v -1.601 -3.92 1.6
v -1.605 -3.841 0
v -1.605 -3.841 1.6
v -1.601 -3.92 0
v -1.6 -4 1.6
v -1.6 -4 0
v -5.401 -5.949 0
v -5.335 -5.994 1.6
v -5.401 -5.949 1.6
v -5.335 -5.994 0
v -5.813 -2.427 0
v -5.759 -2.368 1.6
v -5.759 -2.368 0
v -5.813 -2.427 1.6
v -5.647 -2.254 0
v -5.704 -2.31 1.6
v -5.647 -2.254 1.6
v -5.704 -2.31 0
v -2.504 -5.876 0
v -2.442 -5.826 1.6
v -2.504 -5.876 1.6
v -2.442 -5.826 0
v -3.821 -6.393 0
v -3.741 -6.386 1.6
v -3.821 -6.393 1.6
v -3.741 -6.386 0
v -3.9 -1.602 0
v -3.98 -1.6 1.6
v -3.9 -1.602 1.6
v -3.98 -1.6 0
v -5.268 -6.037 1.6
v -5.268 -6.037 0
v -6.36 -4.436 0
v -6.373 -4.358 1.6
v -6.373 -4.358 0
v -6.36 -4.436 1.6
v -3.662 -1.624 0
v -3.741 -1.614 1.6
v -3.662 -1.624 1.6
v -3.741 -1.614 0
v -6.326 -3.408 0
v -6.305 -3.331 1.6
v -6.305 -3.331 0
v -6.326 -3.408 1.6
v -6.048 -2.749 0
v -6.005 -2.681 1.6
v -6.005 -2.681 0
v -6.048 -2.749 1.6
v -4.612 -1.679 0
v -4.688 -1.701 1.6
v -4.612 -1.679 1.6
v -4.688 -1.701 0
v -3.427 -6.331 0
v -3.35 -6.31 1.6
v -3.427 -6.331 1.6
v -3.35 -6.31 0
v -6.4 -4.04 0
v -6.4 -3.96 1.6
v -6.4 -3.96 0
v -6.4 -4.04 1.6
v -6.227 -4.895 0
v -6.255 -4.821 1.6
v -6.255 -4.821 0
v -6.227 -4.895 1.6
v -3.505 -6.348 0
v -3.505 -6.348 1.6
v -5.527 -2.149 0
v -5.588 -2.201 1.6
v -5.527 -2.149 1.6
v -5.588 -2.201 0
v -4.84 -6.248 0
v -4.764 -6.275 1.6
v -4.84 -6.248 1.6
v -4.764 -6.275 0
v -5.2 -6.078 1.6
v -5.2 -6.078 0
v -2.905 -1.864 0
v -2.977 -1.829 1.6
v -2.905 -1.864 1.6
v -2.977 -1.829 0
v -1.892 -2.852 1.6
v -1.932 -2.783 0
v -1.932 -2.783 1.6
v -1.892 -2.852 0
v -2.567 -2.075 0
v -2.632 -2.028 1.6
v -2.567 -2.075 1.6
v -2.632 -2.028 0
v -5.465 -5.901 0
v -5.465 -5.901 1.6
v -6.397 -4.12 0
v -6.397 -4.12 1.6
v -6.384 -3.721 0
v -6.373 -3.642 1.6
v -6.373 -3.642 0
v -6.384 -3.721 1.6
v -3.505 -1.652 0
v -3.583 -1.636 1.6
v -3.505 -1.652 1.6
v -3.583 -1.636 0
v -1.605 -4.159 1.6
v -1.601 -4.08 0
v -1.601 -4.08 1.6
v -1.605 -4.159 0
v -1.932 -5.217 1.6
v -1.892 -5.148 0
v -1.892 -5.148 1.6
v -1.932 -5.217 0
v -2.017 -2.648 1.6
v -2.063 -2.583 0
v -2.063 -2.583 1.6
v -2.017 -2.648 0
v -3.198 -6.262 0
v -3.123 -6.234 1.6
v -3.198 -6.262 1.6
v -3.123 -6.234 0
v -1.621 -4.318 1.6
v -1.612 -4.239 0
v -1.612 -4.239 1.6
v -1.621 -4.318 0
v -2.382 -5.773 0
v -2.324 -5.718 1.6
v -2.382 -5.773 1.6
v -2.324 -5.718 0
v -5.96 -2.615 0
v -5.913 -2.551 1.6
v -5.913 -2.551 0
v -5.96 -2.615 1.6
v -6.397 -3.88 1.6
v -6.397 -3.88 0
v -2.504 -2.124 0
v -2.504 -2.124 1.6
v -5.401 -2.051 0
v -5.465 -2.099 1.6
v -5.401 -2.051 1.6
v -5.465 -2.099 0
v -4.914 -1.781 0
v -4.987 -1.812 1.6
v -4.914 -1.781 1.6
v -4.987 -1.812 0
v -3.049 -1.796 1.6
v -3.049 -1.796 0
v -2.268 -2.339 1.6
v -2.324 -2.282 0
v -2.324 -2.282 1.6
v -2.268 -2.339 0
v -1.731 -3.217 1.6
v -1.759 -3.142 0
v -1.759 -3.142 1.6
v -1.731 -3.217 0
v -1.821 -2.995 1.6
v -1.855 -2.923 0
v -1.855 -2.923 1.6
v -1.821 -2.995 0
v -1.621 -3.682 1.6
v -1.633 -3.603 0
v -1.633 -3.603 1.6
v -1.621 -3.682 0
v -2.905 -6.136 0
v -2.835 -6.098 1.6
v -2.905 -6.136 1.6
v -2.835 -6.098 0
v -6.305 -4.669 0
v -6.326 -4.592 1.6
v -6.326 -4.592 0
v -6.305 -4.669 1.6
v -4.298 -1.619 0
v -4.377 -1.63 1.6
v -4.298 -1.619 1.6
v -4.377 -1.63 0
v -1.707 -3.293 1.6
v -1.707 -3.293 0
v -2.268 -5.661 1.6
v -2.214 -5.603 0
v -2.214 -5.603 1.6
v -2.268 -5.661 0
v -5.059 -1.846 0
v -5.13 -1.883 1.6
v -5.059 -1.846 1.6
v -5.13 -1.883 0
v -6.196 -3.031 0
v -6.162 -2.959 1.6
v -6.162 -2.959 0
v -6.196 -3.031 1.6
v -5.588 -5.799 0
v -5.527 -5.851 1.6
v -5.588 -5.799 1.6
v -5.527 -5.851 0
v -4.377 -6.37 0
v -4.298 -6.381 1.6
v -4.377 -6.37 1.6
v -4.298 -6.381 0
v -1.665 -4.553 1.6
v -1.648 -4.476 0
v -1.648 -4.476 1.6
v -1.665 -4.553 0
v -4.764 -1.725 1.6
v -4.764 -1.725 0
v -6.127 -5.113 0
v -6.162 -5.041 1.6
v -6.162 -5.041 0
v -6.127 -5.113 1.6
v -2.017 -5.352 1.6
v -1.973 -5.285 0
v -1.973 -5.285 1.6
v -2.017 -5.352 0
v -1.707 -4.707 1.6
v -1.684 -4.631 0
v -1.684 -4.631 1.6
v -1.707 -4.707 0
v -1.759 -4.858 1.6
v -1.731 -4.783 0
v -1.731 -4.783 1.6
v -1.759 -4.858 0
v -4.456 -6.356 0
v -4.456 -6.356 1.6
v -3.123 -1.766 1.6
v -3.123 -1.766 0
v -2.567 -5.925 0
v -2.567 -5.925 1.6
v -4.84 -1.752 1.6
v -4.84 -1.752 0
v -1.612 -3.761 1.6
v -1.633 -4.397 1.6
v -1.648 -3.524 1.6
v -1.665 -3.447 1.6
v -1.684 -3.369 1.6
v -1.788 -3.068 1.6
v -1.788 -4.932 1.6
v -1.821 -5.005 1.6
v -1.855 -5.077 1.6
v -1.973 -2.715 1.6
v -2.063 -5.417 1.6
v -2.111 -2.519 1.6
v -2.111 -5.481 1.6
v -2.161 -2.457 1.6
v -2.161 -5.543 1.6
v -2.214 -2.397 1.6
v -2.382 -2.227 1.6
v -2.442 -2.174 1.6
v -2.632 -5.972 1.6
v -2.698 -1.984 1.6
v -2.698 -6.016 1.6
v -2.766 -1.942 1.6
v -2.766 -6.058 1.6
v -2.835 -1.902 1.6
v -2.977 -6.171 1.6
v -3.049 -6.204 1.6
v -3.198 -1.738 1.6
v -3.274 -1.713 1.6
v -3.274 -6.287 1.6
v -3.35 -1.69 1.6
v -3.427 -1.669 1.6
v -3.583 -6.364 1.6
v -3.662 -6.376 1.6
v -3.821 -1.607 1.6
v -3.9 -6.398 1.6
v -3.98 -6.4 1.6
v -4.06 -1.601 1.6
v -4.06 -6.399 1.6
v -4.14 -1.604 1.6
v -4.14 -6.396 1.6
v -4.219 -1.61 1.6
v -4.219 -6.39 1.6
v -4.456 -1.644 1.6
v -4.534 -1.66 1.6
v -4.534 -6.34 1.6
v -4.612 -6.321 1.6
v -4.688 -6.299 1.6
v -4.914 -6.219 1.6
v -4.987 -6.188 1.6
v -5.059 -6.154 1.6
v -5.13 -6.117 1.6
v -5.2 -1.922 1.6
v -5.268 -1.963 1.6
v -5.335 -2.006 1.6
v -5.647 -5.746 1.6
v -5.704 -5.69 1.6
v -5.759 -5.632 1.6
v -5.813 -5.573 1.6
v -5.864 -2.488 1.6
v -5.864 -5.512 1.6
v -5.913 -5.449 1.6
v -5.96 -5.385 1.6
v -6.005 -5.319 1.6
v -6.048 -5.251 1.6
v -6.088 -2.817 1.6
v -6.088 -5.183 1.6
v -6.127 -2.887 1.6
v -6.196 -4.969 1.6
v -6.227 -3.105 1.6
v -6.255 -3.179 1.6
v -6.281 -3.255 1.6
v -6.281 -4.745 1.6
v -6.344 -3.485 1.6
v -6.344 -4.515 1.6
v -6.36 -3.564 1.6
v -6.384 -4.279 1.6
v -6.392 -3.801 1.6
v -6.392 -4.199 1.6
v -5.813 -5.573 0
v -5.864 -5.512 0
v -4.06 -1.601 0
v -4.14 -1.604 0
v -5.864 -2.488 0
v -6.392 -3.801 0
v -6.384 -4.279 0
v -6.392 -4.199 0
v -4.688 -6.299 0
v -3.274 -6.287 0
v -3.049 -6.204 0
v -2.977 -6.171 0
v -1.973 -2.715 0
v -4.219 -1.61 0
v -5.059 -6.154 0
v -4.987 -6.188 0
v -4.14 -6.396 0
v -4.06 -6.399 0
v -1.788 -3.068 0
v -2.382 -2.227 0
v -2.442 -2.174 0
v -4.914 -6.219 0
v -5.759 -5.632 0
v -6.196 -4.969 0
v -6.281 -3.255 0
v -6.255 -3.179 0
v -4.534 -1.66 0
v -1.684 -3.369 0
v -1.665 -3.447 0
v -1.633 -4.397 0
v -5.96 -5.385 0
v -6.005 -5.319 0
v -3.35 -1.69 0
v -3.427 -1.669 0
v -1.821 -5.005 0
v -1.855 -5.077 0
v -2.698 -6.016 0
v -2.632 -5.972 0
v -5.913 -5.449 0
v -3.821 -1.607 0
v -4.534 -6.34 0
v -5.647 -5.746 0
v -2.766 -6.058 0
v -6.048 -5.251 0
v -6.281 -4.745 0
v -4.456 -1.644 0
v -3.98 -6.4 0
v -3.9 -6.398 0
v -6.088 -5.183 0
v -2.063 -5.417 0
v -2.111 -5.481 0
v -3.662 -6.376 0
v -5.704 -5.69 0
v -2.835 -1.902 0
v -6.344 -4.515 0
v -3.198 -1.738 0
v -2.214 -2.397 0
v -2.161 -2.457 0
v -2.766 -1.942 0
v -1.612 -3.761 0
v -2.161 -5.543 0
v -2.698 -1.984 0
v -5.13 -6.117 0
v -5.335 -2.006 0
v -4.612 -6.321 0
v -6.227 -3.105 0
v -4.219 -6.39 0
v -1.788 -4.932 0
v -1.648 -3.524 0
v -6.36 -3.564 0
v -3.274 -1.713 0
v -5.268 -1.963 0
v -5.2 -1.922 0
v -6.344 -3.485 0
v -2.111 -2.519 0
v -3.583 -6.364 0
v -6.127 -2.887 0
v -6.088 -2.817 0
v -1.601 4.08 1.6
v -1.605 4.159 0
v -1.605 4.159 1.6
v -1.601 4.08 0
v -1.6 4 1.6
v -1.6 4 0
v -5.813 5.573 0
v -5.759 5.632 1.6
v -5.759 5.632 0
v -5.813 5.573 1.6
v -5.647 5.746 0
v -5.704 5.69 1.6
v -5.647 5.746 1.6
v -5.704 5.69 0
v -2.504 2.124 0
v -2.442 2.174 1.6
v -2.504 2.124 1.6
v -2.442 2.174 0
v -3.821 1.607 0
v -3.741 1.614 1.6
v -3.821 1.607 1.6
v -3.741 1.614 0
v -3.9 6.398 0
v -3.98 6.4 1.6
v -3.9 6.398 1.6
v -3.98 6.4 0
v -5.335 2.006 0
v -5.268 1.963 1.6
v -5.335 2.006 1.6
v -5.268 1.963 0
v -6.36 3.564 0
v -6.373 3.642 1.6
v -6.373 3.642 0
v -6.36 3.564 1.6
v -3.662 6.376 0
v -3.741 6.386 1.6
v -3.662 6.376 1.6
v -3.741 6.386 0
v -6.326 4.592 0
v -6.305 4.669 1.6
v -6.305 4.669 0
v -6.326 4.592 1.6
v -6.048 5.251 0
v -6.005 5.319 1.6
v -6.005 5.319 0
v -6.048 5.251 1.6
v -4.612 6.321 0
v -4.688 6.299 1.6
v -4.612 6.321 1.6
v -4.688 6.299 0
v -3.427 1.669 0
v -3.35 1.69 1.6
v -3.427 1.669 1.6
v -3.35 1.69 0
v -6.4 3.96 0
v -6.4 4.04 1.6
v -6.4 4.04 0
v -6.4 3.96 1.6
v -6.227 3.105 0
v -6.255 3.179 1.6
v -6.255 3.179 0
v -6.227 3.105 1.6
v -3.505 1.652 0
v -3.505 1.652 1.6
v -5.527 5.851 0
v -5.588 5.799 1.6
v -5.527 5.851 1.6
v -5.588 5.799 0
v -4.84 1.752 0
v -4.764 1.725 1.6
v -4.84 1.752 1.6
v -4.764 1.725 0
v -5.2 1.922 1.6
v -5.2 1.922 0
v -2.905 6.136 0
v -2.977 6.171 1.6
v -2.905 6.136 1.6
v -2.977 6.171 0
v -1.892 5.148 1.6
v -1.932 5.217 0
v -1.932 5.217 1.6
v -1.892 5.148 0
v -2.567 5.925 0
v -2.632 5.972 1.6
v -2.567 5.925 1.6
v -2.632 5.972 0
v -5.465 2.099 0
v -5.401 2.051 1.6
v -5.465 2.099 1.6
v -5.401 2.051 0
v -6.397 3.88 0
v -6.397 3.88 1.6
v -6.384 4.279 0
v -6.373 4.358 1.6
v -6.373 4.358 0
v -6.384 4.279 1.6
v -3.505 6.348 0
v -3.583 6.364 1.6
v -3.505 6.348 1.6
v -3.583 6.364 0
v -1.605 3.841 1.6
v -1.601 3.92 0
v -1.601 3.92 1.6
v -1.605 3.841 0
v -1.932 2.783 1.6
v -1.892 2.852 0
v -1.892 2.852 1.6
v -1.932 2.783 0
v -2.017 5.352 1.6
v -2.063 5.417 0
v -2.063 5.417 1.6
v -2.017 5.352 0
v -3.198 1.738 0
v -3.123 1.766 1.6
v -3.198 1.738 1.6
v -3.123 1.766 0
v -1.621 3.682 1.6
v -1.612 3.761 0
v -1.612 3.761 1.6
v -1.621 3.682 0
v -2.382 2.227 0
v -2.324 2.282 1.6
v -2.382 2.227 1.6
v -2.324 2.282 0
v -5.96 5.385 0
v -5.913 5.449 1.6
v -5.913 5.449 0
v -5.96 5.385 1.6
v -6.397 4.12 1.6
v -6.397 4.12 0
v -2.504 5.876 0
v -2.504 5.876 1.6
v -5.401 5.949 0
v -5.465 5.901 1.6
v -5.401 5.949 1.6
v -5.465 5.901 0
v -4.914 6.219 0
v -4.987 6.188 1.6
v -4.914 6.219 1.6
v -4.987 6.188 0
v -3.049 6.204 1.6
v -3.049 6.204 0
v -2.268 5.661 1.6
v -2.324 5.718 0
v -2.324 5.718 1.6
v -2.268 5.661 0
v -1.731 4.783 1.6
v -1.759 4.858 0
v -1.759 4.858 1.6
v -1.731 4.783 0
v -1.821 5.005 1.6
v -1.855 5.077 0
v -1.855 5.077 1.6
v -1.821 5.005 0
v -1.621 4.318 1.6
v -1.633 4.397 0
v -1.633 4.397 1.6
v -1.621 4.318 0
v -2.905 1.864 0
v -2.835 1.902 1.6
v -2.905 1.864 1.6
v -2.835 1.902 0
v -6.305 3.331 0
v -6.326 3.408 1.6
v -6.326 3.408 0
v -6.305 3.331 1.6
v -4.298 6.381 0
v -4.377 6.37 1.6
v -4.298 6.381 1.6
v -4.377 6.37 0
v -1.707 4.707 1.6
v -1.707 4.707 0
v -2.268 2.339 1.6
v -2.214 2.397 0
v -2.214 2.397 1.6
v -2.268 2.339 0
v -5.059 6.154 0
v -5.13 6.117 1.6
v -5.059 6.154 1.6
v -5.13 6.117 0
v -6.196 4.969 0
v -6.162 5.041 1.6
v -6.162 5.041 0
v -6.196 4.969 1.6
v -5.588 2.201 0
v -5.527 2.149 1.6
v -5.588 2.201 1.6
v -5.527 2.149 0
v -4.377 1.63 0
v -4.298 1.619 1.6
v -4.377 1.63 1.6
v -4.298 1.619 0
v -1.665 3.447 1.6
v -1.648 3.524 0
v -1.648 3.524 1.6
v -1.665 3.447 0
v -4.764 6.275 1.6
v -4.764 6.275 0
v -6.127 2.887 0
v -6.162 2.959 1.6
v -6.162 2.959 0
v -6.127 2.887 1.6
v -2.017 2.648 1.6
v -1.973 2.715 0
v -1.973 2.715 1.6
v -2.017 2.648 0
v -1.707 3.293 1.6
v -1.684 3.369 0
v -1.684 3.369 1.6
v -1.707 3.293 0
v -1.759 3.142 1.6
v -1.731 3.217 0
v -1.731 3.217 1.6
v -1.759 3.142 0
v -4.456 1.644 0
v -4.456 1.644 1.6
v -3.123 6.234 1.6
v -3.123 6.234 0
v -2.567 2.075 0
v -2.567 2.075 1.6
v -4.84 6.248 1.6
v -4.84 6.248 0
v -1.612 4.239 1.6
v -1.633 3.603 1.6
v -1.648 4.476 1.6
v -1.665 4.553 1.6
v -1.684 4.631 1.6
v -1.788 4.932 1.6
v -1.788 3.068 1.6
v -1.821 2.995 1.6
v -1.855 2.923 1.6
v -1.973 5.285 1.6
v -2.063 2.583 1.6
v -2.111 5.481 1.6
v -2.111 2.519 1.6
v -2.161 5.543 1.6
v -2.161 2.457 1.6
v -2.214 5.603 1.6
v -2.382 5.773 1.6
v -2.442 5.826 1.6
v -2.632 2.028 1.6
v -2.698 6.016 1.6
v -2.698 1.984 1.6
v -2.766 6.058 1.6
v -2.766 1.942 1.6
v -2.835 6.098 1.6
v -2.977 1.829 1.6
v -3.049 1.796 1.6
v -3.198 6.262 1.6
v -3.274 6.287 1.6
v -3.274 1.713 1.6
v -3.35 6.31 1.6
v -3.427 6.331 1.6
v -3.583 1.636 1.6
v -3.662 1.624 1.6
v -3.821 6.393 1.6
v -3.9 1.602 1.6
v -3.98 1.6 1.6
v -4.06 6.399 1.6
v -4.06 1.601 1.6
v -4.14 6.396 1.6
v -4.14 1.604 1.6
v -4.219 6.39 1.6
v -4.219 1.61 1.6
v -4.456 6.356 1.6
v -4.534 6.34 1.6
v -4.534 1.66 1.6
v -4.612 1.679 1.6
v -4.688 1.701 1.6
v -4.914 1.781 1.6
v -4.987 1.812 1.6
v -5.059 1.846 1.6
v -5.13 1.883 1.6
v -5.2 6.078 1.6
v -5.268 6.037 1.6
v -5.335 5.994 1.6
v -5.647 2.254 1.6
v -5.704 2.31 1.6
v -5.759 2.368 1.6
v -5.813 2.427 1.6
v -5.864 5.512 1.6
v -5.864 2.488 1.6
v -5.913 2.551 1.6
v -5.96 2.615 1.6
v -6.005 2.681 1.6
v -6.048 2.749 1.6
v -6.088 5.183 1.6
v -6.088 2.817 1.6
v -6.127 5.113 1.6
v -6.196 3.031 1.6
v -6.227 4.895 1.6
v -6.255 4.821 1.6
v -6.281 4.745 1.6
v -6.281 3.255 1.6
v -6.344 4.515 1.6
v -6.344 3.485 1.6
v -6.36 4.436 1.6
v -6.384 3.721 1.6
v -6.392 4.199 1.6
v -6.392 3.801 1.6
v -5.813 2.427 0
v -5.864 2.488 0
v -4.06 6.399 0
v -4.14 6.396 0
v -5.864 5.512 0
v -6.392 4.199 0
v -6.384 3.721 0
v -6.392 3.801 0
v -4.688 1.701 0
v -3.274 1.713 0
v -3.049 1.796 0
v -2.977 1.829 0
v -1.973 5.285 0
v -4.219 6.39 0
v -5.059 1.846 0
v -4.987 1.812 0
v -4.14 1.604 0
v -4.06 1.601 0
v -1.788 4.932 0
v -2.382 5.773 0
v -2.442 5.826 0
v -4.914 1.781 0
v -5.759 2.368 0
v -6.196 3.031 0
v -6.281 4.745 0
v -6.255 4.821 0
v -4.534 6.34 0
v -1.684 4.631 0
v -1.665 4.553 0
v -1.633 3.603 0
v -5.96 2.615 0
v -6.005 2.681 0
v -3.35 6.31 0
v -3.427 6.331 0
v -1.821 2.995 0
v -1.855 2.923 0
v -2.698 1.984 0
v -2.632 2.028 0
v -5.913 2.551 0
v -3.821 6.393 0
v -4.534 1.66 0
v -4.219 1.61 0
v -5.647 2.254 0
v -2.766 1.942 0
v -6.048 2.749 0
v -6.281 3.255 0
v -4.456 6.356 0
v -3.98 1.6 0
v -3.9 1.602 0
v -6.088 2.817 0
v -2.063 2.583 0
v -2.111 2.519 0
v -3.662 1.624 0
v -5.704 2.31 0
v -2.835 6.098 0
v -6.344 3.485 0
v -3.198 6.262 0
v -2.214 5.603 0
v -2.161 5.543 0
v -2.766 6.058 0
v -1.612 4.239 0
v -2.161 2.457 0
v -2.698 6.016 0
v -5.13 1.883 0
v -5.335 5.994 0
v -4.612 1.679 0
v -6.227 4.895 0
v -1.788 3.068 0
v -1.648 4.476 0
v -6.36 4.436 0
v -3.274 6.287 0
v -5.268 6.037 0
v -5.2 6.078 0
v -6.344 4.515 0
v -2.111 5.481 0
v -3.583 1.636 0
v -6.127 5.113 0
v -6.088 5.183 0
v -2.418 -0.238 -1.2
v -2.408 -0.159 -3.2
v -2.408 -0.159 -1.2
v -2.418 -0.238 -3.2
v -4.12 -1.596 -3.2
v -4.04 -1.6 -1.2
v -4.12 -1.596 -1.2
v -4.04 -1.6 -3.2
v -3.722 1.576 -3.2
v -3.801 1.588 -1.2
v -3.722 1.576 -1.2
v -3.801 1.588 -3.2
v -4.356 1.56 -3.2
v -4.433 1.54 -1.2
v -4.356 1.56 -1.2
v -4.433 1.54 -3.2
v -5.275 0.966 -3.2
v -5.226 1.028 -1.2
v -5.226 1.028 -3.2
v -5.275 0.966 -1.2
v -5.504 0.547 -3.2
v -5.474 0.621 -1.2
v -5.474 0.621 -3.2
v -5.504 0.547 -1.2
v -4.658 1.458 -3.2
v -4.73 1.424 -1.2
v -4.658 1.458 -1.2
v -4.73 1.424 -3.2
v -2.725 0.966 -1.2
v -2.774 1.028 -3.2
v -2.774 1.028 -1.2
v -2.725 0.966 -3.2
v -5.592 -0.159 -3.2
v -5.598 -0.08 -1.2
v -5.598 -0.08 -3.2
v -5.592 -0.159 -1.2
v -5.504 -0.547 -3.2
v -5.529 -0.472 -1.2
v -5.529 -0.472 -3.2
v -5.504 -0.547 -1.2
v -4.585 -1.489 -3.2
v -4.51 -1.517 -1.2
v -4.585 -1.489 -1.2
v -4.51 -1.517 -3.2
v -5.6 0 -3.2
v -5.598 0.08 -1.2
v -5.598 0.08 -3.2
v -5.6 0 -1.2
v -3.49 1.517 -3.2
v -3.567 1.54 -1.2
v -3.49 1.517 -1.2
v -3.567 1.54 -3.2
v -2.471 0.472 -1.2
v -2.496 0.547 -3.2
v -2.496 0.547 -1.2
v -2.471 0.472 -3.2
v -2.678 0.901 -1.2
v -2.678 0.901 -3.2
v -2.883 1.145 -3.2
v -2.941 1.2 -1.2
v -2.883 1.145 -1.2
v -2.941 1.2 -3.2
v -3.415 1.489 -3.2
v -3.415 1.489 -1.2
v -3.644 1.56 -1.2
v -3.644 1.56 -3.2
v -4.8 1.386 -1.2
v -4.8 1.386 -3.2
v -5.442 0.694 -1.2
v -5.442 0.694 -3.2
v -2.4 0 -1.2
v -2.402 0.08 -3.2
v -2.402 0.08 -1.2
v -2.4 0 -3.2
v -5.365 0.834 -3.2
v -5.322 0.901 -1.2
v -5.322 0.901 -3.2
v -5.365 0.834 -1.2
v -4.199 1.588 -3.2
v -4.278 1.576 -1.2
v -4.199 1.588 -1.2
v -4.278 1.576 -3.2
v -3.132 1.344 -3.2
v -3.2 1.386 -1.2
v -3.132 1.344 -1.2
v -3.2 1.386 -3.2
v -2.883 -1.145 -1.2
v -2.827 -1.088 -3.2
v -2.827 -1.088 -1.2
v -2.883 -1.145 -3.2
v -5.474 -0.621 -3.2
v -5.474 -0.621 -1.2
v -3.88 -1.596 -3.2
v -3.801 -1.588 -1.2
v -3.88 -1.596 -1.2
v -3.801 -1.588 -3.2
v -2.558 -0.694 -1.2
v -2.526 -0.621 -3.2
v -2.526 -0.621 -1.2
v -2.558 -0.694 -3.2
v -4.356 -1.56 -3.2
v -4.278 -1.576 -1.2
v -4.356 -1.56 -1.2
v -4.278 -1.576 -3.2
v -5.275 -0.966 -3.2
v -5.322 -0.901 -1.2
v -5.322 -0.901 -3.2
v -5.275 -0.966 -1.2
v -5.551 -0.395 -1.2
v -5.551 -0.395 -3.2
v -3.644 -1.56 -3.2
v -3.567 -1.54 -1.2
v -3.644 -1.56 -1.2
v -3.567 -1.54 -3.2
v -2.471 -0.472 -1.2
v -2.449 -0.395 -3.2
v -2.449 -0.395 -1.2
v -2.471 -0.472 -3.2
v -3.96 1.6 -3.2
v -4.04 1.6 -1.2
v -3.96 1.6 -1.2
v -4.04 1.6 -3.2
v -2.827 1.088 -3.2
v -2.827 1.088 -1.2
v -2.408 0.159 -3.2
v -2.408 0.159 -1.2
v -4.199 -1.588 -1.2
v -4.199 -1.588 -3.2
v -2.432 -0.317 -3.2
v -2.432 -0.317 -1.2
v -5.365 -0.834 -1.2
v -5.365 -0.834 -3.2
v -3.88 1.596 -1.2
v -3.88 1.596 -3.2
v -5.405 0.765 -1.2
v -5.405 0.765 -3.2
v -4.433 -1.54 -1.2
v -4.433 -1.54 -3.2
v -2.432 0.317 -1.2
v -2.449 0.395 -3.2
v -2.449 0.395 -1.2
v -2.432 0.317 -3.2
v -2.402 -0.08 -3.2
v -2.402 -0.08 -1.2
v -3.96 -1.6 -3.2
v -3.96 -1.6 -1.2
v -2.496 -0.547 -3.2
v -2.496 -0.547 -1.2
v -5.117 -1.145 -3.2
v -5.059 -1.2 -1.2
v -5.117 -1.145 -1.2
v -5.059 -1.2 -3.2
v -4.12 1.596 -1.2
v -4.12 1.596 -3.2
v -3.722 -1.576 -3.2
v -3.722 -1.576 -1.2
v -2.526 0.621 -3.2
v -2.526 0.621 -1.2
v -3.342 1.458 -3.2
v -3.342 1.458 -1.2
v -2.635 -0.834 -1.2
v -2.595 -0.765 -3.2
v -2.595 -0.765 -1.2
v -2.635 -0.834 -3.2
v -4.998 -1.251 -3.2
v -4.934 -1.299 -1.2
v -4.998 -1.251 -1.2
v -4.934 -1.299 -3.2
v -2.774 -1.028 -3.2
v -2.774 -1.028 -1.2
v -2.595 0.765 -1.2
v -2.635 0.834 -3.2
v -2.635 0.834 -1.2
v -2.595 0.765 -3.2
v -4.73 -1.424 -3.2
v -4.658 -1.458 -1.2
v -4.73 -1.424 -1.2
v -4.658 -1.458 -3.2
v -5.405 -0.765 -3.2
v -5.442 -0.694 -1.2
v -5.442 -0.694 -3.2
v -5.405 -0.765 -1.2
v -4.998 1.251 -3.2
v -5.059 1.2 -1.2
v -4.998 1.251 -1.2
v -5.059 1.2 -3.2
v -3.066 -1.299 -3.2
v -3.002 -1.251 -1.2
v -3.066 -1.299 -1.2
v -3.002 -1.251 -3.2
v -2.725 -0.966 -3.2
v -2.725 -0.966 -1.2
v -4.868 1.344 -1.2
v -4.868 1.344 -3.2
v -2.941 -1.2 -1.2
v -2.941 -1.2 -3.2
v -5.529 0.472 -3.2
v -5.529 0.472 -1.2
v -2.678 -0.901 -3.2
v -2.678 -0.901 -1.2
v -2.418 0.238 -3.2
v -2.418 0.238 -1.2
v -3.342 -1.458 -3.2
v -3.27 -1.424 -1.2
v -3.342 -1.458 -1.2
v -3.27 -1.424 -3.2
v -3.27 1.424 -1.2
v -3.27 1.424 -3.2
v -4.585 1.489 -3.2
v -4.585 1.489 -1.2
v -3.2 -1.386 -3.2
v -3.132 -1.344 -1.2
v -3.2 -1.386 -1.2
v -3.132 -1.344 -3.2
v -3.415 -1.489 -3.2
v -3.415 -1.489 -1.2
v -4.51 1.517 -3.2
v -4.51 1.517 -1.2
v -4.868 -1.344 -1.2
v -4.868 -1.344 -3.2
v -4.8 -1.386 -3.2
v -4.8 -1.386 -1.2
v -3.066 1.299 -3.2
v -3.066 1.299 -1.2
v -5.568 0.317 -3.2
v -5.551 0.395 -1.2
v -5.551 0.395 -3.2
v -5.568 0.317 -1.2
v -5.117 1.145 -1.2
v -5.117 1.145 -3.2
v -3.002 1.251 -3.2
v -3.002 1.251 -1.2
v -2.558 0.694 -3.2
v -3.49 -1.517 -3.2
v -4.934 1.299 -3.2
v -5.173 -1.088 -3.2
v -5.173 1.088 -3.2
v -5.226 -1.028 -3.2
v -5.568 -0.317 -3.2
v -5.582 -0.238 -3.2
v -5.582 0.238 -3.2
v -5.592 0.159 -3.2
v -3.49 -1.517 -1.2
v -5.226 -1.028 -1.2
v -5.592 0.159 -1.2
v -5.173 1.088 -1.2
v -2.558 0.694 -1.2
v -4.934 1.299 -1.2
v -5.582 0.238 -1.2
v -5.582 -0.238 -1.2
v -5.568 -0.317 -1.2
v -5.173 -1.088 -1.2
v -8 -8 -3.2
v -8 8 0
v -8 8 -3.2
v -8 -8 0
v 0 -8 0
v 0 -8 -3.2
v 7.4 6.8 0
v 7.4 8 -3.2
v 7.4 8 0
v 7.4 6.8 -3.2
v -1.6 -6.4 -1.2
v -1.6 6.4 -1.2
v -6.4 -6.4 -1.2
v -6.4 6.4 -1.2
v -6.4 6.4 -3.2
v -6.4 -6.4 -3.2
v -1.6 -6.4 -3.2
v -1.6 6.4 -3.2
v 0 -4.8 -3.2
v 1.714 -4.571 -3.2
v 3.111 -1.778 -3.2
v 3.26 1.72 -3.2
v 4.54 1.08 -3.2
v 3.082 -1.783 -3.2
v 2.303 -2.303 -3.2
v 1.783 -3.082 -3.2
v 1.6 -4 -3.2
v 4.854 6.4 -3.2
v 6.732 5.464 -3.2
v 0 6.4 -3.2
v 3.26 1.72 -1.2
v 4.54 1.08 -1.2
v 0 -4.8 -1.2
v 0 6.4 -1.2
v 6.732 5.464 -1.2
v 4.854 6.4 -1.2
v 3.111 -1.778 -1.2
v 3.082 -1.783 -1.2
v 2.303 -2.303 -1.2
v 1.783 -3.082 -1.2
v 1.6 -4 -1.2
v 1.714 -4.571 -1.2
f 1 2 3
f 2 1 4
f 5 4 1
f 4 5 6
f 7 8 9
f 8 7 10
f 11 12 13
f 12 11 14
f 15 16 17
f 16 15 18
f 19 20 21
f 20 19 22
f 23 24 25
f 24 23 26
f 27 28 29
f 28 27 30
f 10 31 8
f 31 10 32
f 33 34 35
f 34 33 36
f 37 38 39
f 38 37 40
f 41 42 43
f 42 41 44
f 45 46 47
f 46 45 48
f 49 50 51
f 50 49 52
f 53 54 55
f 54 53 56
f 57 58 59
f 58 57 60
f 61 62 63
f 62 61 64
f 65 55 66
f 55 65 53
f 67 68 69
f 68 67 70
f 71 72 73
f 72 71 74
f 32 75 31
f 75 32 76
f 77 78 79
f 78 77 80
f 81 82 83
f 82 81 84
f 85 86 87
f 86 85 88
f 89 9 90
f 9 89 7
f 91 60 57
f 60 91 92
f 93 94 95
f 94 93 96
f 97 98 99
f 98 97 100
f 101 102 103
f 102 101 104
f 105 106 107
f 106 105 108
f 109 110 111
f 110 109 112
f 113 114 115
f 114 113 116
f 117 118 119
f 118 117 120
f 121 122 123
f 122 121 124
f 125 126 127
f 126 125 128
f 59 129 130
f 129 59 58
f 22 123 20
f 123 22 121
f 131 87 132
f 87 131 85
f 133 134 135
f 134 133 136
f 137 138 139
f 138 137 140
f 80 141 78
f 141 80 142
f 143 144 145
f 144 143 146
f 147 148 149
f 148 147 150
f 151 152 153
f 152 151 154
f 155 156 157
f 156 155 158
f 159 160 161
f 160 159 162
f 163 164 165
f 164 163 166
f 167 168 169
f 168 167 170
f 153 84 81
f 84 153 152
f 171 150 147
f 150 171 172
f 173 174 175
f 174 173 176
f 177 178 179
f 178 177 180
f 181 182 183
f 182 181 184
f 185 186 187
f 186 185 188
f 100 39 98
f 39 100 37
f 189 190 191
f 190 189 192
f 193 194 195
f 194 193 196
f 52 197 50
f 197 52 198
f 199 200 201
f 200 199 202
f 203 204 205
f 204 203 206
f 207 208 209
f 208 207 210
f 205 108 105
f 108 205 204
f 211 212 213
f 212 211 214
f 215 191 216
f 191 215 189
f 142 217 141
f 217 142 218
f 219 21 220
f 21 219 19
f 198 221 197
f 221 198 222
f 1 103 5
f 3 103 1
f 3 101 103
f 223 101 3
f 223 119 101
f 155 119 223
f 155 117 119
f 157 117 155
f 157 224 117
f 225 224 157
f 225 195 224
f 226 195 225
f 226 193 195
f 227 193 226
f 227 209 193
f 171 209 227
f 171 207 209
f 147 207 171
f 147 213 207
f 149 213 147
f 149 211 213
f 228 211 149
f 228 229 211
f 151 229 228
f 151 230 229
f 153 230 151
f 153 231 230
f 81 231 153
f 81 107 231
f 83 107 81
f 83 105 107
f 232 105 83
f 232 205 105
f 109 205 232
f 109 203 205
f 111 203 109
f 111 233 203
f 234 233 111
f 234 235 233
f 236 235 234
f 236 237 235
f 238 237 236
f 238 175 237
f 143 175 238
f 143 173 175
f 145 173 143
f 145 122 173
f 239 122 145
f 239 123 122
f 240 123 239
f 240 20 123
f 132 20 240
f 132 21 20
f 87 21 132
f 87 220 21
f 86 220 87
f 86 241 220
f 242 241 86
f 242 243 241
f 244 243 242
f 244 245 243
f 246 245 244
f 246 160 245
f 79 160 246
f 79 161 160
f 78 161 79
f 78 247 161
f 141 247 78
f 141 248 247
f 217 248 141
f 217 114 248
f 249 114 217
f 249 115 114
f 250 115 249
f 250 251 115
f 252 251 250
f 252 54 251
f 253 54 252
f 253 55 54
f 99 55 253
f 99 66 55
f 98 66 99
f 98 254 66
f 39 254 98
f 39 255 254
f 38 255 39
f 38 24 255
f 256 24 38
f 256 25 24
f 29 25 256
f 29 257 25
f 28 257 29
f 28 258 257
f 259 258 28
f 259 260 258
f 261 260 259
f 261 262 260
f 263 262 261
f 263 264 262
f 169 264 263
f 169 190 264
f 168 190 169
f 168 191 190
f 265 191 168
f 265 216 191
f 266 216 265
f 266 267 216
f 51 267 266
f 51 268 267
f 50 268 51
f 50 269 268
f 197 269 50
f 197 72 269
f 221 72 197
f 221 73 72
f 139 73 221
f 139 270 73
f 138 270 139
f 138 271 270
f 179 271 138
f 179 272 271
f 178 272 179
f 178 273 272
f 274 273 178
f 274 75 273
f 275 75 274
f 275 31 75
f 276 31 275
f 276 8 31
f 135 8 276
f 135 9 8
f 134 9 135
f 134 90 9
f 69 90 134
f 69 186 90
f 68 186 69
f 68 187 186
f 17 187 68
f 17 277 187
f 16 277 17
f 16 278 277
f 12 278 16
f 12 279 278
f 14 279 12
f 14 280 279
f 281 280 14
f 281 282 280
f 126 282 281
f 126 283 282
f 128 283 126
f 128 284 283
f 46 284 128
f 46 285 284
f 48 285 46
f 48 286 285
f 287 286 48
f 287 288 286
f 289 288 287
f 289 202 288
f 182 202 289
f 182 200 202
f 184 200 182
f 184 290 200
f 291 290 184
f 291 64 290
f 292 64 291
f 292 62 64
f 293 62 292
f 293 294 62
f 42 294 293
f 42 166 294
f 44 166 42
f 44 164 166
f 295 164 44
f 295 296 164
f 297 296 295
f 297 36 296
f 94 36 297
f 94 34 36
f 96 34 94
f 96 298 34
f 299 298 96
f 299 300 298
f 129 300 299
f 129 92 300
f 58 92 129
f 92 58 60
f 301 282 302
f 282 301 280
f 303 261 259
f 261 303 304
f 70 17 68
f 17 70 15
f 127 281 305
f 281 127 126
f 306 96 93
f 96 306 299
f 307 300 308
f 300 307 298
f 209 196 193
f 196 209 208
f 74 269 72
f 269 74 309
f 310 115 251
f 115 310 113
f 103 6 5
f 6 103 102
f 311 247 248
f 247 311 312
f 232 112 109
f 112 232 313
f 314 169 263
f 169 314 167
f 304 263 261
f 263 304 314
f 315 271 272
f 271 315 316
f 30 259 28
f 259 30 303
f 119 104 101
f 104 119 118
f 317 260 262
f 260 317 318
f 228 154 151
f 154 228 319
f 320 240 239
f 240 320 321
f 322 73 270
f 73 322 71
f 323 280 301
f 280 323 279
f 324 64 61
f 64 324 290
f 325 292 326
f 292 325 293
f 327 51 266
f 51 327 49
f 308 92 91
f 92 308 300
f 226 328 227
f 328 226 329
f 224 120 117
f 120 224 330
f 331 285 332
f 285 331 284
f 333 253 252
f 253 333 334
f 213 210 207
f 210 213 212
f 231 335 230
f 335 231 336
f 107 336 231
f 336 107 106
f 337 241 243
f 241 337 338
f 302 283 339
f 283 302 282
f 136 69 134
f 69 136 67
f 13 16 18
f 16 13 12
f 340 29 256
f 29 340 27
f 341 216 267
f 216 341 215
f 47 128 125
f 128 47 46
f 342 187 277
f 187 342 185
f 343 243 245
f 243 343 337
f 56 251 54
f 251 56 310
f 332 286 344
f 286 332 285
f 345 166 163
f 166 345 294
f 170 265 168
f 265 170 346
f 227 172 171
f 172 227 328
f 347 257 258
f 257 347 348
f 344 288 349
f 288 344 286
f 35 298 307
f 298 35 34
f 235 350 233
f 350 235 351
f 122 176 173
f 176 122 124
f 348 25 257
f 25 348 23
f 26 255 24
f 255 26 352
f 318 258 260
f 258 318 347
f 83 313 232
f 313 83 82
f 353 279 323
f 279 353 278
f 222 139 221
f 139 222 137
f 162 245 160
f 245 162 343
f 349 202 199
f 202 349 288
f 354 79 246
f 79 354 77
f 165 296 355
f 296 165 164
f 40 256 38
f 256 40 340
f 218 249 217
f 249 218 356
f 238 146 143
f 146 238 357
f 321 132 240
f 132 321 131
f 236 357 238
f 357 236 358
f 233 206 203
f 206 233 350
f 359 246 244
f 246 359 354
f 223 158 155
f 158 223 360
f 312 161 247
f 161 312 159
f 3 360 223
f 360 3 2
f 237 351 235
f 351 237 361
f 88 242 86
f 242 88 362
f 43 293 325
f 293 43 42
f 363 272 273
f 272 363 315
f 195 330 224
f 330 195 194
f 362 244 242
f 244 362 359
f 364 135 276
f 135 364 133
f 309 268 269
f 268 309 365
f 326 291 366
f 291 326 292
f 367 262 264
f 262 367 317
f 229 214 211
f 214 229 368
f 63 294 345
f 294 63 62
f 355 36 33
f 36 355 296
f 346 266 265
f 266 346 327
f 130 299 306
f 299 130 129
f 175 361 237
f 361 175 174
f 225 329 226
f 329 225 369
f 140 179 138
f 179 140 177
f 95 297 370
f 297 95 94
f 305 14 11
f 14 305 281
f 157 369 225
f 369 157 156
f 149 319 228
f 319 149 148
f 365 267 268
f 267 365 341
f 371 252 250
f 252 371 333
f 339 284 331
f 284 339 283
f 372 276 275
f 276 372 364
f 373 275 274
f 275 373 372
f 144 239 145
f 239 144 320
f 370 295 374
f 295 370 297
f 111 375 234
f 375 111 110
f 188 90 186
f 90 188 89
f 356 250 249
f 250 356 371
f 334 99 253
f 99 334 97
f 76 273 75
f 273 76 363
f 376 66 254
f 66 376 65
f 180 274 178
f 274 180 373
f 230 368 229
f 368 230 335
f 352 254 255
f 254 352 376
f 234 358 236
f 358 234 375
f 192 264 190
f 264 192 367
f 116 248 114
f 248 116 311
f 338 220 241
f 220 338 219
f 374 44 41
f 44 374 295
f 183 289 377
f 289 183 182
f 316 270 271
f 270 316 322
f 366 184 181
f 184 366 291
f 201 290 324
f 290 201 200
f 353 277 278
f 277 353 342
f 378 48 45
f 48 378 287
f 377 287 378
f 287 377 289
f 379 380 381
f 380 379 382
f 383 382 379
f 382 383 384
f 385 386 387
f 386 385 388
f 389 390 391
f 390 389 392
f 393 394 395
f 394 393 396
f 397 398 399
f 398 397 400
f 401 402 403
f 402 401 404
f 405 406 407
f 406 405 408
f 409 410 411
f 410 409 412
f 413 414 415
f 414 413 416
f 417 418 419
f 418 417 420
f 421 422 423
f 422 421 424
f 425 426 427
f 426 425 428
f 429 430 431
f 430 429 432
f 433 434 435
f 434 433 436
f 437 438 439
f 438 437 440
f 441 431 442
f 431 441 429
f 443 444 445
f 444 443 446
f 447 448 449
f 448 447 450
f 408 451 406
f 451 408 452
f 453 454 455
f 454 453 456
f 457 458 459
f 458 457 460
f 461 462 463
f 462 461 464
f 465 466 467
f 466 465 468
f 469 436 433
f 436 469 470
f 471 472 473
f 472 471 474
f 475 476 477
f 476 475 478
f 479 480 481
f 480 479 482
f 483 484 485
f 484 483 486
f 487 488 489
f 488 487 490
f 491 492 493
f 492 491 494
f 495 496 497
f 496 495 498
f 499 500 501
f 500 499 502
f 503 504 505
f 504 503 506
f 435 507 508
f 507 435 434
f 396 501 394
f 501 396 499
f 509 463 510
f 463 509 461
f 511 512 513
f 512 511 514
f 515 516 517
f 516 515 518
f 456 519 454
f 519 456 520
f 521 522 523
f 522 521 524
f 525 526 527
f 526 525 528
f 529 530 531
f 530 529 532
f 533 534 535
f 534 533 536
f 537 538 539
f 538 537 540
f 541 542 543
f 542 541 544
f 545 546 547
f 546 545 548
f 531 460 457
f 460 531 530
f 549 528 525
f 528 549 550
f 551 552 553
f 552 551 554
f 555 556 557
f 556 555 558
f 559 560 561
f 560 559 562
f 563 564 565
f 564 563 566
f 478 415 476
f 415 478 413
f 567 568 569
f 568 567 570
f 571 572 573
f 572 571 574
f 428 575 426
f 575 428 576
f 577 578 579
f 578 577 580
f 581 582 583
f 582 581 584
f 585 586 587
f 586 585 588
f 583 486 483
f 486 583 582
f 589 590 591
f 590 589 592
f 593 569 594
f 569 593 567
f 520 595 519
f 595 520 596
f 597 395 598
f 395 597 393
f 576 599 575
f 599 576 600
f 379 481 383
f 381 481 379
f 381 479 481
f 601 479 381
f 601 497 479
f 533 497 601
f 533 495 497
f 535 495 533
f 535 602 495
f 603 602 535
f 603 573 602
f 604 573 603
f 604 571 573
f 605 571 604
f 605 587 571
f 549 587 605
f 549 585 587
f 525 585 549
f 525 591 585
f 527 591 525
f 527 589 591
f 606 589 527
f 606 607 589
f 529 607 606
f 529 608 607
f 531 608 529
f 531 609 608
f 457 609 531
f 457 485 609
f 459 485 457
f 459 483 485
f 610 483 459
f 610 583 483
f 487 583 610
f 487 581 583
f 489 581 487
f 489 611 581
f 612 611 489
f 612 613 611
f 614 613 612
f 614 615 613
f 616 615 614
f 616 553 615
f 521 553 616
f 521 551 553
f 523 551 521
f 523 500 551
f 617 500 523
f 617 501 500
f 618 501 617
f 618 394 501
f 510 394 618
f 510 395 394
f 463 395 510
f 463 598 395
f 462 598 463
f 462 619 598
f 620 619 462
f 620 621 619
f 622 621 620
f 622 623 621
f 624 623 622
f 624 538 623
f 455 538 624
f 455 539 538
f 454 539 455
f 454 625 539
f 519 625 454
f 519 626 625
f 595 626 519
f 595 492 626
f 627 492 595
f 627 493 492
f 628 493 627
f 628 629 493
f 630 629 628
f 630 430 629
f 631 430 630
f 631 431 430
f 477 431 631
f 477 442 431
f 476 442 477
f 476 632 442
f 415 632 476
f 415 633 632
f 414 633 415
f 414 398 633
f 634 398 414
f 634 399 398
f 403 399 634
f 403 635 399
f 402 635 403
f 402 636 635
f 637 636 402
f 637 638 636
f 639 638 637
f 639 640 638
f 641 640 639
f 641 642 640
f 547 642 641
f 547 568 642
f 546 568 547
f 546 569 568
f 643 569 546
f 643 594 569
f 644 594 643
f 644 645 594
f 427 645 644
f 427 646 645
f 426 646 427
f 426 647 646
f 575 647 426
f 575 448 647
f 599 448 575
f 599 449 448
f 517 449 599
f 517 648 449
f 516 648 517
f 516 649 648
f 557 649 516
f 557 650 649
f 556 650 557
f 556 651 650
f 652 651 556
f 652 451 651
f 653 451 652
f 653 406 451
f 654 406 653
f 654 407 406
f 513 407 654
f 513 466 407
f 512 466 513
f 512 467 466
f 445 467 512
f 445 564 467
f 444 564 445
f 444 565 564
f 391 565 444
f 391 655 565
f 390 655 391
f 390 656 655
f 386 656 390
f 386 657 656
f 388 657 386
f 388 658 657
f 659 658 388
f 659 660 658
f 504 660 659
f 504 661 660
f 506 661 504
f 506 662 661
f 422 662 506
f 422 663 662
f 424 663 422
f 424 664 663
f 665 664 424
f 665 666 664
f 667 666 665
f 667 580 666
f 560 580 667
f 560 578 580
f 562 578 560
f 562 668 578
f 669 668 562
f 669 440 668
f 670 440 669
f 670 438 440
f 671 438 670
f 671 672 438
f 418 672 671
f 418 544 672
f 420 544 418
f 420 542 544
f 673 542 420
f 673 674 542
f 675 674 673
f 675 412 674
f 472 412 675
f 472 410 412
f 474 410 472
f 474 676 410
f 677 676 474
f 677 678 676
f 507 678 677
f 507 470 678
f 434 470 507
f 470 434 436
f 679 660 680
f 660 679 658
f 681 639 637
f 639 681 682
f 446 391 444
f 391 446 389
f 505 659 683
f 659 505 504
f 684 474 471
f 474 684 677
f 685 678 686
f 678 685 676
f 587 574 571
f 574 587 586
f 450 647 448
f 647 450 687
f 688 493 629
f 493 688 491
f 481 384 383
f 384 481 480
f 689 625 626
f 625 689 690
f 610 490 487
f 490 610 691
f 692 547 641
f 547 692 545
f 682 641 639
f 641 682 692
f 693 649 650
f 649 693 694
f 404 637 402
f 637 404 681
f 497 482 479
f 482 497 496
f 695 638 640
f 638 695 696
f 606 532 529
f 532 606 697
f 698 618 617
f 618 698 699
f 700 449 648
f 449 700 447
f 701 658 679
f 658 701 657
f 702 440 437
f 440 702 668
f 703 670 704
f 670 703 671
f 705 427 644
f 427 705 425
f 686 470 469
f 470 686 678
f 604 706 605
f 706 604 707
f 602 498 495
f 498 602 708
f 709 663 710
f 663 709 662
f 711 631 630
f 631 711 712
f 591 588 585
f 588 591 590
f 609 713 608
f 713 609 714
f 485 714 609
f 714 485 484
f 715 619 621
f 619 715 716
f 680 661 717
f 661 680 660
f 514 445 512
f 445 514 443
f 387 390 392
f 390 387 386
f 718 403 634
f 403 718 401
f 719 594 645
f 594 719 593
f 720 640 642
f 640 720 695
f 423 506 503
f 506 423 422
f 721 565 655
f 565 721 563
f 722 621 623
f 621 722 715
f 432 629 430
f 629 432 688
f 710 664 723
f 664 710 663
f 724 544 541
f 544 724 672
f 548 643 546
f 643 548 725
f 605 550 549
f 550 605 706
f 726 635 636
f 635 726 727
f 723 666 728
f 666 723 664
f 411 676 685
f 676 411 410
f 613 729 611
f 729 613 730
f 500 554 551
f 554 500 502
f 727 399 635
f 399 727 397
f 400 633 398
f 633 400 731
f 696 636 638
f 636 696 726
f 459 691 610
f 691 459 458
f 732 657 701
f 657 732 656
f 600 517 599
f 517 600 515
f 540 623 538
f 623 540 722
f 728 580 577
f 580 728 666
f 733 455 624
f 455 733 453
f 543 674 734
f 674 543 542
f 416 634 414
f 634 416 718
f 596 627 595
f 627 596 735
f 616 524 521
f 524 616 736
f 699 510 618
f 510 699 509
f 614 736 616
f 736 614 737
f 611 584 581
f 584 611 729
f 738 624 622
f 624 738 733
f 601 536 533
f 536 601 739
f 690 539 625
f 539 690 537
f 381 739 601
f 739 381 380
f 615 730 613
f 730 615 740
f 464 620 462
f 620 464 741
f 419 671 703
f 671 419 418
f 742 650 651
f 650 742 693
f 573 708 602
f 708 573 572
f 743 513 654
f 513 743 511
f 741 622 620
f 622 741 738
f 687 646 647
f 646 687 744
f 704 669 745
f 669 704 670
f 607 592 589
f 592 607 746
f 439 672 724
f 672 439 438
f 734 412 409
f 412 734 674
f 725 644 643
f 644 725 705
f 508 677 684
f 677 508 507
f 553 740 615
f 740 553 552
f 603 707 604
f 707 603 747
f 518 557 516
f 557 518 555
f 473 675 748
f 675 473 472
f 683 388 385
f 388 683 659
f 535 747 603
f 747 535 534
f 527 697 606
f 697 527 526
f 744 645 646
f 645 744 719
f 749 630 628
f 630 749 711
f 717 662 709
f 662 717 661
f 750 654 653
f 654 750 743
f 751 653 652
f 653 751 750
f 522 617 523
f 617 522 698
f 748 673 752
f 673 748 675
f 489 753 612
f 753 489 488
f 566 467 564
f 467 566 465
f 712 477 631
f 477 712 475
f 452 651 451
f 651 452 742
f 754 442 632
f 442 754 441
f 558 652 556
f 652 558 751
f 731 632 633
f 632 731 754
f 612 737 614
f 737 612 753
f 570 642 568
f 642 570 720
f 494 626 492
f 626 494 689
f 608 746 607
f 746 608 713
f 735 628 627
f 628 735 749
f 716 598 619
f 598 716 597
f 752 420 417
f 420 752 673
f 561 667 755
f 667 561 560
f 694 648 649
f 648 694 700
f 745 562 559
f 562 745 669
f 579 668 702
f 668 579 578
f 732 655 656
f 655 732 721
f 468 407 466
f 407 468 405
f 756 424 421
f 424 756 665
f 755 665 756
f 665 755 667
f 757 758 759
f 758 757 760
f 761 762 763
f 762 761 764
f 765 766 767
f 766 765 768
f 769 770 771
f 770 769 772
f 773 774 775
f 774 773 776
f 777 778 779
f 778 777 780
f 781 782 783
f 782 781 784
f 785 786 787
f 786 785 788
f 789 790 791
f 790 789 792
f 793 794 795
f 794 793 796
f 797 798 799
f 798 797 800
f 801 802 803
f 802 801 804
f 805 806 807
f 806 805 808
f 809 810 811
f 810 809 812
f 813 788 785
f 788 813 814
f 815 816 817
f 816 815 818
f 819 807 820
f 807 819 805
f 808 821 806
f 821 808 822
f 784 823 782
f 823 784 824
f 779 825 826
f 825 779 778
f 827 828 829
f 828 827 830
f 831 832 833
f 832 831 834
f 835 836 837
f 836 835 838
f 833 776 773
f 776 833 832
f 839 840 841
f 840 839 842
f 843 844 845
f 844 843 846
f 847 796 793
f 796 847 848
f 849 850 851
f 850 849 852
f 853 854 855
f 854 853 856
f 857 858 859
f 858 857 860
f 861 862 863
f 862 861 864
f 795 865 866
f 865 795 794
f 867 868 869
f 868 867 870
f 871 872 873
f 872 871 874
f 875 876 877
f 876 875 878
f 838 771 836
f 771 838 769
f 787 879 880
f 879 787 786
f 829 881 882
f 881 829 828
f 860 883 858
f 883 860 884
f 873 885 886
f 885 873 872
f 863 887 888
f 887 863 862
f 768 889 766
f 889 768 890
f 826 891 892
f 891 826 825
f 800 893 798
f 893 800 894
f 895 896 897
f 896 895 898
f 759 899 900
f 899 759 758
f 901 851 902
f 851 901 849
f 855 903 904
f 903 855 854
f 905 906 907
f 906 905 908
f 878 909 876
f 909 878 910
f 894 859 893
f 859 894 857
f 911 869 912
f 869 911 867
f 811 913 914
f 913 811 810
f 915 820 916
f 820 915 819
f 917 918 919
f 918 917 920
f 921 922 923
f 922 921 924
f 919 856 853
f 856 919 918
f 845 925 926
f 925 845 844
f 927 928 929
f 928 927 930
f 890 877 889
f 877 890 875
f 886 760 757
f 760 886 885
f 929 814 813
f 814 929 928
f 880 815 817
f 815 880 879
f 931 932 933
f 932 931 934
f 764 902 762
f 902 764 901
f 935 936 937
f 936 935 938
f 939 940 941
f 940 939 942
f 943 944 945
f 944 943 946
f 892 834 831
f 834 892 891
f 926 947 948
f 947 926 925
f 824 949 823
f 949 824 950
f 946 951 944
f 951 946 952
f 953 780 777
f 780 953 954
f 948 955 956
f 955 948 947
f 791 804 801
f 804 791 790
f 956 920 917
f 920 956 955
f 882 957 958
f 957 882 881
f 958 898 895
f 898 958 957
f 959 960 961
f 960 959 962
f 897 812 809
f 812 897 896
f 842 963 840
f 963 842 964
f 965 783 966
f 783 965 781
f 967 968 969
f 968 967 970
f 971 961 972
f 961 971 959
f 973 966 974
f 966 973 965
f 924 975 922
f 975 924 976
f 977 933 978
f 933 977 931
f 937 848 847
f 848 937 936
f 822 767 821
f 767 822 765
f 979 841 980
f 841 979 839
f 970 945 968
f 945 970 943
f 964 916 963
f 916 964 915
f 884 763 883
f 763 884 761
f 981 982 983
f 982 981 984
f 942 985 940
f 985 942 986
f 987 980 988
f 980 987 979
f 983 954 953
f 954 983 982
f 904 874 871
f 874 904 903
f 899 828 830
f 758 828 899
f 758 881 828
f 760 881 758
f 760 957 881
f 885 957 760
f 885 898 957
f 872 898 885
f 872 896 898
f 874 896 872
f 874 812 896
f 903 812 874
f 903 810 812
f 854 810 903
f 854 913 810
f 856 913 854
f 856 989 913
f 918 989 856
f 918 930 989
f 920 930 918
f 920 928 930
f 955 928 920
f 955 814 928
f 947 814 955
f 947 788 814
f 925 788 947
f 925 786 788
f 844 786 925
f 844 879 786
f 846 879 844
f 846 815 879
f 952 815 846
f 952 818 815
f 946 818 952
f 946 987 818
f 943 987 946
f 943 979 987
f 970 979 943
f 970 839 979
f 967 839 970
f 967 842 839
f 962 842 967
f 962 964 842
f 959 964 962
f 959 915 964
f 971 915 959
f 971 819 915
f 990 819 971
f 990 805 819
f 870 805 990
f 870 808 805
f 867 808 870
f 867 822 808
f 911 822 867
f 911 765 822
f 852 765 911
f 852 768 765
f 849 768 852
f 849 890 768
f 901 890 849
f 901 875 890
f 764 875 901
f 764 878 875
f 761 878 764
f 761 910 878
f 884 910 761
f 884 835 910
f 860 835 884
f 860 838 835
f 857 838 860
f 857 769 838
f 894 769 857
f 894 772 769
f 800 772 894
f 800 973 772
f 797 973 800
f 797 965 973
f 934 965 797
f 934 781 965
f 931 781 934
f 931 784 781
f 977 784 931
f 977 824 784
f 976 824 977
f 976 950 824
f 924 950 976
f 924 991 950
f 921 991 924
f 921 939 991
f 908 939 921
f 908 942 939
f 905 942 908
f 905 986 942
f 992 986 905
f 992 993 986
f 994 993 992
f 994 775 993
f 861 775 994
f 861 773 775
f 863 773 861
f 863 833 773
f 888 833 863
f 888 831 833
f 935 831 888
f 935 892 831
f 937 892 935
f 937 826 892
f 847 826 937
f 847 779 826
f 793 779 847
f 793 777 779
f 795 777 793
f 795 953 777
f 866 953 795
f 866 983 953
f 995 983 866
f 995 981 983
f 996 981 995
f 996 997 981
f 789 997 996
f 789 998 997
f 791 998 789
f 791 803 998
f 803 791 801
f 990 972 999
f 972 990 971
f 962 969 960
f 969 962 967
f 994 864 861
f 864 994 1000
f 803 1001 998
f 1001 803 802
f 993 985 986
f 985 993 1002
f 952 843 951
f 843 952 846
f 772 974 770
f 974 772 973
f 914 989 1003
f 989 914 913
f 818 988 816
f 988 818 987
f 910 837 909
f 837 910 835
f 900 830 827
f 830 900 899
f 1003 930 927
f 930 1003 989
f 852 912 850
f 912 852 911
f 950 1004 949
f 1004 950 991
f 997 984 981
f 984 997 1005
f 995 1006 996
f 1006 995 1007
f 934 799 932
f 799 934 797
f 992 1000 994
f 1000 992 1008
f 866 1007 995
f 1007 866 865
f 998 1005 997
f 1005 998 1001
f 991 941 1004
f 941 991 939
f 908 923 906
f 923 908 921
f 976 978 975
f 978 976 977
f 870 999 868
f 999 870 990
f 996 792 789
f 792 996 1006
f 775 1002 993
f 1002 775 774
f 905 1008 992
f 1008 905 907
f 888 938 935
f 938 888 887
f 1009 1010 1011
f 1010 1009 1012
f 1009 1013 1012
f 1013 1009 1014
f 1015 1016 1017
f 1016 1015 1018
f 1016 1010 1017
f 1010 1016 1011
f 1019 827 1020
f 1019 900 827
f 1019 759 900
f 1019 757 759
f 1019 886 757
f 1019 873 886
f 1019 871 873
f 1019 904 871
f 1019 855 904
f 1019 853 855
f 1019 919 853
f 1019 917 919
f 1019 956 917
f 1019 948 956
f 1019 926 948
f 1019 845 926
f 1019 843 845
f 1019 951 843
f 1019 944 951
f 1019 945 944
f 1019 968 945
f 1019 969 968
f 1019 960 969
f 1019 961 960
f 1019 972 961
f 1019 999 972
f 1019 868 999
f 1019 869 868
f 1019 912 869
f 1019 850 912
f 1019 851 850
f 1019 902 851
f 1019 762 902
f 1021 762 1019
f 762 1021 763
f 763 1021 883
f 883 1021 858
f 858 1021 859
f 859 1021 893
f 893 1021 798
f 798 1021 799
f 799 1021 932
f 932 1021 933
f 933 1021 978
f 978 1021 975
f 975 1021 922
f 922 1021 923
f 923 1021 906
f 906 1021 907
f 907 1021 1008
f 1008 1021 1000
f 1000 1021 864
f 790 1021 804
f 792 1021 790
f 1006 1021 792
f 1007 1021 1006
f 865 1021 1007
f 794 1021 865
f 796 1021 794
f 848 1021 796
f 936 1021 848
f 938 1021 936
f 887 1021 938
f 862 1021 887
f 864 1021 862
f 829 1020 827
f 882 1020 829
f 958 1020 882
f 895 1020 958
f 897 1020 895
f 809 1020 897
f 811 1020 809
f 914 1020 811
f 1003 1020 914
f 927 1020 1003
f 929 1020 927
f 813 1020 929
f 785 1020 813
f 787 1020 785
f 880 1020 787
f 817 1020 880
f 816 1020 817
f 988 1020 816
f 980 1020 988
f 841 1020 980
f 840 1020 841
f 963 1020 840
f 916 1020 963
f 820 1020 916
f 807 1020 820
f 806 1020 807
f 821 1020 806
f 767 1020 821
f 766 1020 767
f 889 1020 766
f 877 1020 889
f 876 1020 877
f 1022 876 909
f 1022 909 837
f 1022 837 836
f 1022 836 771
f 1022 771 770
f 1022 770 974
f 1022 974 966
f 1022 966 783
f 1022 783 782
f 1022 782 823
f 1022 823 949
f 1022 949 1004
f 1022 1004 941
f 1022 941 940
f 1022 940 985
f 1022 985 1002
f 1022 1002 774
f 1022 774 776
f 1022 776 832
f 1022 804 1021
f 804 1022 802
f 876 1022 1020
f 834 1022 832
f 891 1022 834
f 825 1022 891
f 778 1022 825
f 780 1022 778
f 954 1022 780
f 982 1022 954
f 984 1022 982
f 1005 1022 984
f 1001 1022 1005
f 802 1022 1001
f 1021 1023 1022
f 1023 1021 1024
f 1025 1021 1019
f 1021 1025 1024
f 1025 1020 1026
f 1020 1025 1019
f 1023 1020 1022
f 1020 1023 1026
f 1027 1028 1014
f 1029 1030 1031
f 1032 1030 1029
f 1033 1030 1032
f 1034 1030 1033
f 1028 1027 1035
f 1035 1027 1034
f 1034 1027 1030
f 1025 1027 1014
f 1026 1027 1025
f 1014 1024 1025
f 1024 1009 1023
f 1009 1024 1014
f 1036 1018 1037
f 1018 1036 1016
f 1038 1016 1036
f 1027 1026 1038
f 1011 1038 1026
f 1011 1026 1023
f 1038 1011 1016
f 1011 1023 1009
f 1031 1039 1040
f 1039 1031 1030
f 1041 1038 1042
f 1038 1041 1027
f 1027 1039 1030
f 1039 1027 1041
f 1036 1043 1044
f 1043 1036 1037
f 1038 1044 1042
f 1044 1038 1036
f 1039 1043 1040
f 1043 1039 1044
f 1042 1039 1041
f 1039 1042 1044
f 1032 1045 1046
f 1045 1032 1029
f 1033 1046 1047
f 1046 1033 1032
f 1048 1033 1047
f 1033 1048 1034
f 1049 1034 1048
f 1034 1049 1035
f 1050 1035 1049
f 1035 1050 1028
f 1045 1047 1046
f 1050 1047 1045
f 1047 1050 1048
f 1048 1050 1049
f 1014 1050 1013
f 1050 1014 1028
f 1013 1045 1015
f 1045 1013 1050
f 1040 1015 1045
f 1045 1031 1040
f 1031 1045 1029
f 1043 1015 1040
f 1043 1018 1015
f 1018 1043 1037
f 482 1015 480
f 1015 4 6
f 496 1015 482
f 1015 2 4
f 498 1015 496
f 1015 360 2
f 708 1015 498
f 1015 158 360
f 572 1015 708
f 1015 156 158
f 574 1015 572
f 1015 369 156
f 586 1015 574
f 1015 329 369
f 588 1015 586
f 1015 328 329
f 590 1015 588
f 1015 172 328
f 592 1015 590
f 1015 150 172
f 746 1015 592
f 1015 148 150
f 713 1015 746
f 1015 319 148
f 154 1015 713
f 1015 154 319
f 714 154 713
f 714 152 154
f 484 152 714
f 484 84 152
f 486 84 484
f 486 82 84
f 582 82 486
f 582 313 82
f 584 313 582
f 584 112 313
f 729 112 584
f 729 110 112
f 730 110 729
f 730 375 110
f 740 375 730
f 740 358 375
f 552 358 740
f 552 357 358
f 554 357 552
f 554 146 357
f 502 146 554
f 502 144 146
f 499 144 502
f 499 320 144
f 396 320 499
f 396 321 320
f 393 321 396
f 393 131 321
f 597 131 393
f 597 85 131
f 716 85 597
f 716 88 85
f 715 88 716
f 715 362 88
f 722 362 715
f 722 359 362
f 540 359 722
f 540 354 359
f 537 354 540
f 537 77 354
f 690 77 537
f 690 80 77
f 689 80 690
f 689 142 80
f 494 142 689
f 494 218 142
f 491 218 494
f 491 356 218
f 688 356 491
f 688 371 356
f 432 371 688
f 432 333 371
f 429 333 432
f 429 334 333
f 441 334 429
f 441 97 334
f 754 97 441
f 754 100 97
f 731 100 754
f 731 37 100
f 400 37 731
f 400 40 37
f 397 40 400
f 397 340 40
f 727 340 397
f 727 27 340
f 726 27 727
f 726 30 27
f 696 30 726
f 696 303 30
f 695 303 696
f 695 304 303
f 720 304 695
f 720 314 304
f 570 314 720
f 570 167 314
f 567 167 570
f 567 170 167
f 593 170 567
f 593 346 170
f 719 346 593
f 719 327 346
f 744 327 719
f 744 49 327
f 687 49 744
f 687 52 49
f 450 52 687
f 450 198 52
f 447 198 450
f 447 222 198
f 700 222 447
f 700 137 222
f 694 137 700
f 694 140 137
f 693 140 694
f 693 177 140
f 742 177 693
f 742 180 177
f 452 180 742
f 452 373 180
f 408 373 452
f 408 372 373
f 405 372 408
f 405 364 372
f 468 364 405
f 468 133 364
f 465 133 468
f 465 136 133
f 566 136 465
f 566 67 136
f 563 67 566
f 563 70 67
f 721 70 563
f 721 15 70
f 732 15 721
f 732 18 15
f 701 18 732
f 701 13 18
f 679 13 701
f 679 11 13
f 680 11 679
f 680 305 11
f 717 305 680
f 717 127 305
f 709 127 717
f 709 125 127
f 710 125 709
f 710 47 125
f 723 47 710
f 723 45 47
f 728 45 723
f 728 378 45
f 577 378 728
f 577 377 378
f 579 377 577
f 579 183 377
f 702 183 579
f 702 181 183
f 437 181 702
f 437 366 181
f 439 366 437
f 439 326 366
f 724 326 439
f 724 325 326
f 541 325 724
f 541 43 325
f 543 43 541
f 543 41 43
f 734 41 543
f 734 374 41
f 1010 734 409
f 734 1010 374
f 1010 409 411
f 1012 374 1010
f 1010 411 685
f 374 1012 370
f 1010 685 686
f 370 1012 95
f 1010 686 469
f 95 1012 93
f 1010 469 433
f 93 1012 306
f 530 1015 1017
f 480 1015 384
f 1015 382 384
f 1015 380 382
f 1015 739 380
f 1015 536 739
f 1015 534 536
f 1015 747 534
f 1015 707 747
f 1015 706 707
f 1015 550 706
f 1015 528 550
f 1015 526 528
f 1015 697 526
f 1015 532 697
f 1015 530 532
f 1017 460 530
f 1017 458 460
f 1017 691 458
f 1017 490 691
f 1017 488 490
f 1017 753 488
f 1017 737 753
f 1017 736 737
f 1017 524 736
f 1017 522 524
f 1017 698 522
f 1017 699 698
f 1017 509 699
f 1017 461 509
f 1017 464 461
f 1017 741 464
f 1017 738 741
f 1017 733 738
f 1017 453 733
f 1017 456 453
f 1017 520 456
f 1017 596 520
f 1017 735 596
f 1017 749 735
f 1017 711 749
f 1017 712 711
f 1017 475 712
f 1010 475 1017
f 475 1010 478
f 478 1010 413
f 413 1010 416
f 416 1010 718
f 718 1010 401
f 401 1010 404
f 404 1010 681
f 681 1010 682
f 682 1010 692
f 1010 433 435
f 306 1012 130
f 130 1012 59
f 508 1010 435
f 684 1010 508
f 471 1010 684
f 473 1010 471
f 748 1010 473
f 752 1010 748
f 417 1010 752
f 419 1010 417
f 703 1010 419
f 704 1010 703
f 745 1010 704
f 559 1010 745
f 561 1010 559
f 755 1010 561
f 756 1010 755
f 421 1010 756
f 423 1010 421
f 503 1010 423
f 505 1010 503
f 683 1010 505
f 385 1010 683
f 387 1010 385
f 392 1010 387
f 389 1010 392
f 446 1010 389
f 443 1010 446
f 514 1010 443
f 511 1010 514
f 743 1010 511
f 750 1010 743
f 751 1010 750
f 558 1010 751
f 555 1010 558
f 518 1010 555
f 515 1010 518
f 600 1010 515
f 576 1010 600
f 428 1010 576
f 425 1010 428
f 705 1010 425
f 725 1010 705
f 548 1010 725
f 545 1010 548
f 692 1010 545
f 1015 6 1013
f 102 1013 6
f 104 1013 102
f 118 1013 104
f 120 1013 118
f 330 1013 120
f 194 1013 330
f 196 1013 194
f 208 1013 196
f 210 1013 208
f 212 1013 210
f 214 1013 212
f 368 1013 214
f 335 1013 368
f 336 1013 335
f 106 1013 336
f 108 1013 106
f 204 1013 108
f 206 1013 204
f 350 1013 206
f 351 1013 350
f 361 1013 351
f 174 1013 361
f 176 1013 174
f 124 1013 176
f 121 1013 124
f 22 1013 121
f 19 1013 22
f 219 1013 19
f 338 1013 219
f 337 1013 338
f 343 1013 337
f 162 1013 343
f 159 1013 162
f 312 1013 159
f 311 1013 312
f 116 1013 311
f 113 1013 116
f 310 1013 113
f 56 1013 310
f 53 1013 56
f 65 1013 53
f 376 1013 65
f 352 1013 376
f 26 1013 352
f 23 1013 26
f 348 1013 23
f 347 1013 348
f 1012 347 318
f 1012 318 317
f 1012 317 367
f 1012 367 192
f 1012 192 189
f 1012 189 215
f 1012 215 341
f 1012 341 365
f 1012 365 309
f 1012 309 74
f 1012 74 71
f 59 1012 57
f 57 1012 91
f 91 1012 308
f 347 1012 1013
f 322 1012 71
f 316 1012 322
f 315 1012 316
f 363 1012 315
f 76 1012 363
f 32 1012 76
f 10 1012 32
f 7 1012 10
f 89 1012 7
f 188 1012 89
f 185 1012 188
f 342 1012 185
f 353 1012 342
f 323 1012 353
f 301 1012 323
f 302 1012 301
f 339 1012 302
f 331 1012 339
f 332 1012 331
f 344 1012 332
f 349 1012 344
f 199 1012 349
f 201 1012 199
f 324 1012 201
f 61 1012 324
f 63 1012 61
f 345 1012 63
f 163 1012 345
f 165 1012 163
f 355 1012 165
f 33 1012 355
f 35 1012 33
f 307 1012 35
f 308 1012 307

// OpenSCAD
use <../lib.scad>
use <s/24299s01.scad>
use <../p/stug-1x2.scad>
$fa=1; $fs=0.2;
function ldraw_lib__24299(realsolid=false) = [
// 0 Wing  2 x  2 Left
// 0 Name: 24299.dat
// 0 Author: Magnus Forsberg [MagFors]
// 0 !LDRAW_ORG Part UPDATE 2017-01
// 0 !LICENSE Licensed under CC BY 2.0 and CC BY 4.0 : see CAreadme.txt
// 
// 0 BFC CERTIFY CCW
  [0,"BFC","CERTIFY"],
  [0,"BFC","CCW"],
// 
// 0 !HISTORY 2017-12-30 [PTadmin] Official Update 2017-01
// 
// 
// 1 16 -10 0 0 0 0 -1 0 1 0 1 0 0 stug-1x2.dat
  [1,16,-10,0,0,0,0,-1,0,1,0,1,0,0, ldraw_lib__stug_1x2(realsolid)],
// 1 16 0 0 0 1 0 0 0 1 0 0 0 1 s\24299s01.dat
  [1,16,0,0,0,1,0,0,0,1,0,0,0,1, ldraw_lib__s__24299s01(realsolid)],
];
module ldraw_lib__24299(step=0, col=false, unit=2/5, alt=false, line=0.2, solid=!$preview)
    makepoly(ldraw_lib__24299(solid), step=step, col=col, unit=unit, alt=alt, line=line, solid=solid);
ldraw_lib__24299(line=0.2);
